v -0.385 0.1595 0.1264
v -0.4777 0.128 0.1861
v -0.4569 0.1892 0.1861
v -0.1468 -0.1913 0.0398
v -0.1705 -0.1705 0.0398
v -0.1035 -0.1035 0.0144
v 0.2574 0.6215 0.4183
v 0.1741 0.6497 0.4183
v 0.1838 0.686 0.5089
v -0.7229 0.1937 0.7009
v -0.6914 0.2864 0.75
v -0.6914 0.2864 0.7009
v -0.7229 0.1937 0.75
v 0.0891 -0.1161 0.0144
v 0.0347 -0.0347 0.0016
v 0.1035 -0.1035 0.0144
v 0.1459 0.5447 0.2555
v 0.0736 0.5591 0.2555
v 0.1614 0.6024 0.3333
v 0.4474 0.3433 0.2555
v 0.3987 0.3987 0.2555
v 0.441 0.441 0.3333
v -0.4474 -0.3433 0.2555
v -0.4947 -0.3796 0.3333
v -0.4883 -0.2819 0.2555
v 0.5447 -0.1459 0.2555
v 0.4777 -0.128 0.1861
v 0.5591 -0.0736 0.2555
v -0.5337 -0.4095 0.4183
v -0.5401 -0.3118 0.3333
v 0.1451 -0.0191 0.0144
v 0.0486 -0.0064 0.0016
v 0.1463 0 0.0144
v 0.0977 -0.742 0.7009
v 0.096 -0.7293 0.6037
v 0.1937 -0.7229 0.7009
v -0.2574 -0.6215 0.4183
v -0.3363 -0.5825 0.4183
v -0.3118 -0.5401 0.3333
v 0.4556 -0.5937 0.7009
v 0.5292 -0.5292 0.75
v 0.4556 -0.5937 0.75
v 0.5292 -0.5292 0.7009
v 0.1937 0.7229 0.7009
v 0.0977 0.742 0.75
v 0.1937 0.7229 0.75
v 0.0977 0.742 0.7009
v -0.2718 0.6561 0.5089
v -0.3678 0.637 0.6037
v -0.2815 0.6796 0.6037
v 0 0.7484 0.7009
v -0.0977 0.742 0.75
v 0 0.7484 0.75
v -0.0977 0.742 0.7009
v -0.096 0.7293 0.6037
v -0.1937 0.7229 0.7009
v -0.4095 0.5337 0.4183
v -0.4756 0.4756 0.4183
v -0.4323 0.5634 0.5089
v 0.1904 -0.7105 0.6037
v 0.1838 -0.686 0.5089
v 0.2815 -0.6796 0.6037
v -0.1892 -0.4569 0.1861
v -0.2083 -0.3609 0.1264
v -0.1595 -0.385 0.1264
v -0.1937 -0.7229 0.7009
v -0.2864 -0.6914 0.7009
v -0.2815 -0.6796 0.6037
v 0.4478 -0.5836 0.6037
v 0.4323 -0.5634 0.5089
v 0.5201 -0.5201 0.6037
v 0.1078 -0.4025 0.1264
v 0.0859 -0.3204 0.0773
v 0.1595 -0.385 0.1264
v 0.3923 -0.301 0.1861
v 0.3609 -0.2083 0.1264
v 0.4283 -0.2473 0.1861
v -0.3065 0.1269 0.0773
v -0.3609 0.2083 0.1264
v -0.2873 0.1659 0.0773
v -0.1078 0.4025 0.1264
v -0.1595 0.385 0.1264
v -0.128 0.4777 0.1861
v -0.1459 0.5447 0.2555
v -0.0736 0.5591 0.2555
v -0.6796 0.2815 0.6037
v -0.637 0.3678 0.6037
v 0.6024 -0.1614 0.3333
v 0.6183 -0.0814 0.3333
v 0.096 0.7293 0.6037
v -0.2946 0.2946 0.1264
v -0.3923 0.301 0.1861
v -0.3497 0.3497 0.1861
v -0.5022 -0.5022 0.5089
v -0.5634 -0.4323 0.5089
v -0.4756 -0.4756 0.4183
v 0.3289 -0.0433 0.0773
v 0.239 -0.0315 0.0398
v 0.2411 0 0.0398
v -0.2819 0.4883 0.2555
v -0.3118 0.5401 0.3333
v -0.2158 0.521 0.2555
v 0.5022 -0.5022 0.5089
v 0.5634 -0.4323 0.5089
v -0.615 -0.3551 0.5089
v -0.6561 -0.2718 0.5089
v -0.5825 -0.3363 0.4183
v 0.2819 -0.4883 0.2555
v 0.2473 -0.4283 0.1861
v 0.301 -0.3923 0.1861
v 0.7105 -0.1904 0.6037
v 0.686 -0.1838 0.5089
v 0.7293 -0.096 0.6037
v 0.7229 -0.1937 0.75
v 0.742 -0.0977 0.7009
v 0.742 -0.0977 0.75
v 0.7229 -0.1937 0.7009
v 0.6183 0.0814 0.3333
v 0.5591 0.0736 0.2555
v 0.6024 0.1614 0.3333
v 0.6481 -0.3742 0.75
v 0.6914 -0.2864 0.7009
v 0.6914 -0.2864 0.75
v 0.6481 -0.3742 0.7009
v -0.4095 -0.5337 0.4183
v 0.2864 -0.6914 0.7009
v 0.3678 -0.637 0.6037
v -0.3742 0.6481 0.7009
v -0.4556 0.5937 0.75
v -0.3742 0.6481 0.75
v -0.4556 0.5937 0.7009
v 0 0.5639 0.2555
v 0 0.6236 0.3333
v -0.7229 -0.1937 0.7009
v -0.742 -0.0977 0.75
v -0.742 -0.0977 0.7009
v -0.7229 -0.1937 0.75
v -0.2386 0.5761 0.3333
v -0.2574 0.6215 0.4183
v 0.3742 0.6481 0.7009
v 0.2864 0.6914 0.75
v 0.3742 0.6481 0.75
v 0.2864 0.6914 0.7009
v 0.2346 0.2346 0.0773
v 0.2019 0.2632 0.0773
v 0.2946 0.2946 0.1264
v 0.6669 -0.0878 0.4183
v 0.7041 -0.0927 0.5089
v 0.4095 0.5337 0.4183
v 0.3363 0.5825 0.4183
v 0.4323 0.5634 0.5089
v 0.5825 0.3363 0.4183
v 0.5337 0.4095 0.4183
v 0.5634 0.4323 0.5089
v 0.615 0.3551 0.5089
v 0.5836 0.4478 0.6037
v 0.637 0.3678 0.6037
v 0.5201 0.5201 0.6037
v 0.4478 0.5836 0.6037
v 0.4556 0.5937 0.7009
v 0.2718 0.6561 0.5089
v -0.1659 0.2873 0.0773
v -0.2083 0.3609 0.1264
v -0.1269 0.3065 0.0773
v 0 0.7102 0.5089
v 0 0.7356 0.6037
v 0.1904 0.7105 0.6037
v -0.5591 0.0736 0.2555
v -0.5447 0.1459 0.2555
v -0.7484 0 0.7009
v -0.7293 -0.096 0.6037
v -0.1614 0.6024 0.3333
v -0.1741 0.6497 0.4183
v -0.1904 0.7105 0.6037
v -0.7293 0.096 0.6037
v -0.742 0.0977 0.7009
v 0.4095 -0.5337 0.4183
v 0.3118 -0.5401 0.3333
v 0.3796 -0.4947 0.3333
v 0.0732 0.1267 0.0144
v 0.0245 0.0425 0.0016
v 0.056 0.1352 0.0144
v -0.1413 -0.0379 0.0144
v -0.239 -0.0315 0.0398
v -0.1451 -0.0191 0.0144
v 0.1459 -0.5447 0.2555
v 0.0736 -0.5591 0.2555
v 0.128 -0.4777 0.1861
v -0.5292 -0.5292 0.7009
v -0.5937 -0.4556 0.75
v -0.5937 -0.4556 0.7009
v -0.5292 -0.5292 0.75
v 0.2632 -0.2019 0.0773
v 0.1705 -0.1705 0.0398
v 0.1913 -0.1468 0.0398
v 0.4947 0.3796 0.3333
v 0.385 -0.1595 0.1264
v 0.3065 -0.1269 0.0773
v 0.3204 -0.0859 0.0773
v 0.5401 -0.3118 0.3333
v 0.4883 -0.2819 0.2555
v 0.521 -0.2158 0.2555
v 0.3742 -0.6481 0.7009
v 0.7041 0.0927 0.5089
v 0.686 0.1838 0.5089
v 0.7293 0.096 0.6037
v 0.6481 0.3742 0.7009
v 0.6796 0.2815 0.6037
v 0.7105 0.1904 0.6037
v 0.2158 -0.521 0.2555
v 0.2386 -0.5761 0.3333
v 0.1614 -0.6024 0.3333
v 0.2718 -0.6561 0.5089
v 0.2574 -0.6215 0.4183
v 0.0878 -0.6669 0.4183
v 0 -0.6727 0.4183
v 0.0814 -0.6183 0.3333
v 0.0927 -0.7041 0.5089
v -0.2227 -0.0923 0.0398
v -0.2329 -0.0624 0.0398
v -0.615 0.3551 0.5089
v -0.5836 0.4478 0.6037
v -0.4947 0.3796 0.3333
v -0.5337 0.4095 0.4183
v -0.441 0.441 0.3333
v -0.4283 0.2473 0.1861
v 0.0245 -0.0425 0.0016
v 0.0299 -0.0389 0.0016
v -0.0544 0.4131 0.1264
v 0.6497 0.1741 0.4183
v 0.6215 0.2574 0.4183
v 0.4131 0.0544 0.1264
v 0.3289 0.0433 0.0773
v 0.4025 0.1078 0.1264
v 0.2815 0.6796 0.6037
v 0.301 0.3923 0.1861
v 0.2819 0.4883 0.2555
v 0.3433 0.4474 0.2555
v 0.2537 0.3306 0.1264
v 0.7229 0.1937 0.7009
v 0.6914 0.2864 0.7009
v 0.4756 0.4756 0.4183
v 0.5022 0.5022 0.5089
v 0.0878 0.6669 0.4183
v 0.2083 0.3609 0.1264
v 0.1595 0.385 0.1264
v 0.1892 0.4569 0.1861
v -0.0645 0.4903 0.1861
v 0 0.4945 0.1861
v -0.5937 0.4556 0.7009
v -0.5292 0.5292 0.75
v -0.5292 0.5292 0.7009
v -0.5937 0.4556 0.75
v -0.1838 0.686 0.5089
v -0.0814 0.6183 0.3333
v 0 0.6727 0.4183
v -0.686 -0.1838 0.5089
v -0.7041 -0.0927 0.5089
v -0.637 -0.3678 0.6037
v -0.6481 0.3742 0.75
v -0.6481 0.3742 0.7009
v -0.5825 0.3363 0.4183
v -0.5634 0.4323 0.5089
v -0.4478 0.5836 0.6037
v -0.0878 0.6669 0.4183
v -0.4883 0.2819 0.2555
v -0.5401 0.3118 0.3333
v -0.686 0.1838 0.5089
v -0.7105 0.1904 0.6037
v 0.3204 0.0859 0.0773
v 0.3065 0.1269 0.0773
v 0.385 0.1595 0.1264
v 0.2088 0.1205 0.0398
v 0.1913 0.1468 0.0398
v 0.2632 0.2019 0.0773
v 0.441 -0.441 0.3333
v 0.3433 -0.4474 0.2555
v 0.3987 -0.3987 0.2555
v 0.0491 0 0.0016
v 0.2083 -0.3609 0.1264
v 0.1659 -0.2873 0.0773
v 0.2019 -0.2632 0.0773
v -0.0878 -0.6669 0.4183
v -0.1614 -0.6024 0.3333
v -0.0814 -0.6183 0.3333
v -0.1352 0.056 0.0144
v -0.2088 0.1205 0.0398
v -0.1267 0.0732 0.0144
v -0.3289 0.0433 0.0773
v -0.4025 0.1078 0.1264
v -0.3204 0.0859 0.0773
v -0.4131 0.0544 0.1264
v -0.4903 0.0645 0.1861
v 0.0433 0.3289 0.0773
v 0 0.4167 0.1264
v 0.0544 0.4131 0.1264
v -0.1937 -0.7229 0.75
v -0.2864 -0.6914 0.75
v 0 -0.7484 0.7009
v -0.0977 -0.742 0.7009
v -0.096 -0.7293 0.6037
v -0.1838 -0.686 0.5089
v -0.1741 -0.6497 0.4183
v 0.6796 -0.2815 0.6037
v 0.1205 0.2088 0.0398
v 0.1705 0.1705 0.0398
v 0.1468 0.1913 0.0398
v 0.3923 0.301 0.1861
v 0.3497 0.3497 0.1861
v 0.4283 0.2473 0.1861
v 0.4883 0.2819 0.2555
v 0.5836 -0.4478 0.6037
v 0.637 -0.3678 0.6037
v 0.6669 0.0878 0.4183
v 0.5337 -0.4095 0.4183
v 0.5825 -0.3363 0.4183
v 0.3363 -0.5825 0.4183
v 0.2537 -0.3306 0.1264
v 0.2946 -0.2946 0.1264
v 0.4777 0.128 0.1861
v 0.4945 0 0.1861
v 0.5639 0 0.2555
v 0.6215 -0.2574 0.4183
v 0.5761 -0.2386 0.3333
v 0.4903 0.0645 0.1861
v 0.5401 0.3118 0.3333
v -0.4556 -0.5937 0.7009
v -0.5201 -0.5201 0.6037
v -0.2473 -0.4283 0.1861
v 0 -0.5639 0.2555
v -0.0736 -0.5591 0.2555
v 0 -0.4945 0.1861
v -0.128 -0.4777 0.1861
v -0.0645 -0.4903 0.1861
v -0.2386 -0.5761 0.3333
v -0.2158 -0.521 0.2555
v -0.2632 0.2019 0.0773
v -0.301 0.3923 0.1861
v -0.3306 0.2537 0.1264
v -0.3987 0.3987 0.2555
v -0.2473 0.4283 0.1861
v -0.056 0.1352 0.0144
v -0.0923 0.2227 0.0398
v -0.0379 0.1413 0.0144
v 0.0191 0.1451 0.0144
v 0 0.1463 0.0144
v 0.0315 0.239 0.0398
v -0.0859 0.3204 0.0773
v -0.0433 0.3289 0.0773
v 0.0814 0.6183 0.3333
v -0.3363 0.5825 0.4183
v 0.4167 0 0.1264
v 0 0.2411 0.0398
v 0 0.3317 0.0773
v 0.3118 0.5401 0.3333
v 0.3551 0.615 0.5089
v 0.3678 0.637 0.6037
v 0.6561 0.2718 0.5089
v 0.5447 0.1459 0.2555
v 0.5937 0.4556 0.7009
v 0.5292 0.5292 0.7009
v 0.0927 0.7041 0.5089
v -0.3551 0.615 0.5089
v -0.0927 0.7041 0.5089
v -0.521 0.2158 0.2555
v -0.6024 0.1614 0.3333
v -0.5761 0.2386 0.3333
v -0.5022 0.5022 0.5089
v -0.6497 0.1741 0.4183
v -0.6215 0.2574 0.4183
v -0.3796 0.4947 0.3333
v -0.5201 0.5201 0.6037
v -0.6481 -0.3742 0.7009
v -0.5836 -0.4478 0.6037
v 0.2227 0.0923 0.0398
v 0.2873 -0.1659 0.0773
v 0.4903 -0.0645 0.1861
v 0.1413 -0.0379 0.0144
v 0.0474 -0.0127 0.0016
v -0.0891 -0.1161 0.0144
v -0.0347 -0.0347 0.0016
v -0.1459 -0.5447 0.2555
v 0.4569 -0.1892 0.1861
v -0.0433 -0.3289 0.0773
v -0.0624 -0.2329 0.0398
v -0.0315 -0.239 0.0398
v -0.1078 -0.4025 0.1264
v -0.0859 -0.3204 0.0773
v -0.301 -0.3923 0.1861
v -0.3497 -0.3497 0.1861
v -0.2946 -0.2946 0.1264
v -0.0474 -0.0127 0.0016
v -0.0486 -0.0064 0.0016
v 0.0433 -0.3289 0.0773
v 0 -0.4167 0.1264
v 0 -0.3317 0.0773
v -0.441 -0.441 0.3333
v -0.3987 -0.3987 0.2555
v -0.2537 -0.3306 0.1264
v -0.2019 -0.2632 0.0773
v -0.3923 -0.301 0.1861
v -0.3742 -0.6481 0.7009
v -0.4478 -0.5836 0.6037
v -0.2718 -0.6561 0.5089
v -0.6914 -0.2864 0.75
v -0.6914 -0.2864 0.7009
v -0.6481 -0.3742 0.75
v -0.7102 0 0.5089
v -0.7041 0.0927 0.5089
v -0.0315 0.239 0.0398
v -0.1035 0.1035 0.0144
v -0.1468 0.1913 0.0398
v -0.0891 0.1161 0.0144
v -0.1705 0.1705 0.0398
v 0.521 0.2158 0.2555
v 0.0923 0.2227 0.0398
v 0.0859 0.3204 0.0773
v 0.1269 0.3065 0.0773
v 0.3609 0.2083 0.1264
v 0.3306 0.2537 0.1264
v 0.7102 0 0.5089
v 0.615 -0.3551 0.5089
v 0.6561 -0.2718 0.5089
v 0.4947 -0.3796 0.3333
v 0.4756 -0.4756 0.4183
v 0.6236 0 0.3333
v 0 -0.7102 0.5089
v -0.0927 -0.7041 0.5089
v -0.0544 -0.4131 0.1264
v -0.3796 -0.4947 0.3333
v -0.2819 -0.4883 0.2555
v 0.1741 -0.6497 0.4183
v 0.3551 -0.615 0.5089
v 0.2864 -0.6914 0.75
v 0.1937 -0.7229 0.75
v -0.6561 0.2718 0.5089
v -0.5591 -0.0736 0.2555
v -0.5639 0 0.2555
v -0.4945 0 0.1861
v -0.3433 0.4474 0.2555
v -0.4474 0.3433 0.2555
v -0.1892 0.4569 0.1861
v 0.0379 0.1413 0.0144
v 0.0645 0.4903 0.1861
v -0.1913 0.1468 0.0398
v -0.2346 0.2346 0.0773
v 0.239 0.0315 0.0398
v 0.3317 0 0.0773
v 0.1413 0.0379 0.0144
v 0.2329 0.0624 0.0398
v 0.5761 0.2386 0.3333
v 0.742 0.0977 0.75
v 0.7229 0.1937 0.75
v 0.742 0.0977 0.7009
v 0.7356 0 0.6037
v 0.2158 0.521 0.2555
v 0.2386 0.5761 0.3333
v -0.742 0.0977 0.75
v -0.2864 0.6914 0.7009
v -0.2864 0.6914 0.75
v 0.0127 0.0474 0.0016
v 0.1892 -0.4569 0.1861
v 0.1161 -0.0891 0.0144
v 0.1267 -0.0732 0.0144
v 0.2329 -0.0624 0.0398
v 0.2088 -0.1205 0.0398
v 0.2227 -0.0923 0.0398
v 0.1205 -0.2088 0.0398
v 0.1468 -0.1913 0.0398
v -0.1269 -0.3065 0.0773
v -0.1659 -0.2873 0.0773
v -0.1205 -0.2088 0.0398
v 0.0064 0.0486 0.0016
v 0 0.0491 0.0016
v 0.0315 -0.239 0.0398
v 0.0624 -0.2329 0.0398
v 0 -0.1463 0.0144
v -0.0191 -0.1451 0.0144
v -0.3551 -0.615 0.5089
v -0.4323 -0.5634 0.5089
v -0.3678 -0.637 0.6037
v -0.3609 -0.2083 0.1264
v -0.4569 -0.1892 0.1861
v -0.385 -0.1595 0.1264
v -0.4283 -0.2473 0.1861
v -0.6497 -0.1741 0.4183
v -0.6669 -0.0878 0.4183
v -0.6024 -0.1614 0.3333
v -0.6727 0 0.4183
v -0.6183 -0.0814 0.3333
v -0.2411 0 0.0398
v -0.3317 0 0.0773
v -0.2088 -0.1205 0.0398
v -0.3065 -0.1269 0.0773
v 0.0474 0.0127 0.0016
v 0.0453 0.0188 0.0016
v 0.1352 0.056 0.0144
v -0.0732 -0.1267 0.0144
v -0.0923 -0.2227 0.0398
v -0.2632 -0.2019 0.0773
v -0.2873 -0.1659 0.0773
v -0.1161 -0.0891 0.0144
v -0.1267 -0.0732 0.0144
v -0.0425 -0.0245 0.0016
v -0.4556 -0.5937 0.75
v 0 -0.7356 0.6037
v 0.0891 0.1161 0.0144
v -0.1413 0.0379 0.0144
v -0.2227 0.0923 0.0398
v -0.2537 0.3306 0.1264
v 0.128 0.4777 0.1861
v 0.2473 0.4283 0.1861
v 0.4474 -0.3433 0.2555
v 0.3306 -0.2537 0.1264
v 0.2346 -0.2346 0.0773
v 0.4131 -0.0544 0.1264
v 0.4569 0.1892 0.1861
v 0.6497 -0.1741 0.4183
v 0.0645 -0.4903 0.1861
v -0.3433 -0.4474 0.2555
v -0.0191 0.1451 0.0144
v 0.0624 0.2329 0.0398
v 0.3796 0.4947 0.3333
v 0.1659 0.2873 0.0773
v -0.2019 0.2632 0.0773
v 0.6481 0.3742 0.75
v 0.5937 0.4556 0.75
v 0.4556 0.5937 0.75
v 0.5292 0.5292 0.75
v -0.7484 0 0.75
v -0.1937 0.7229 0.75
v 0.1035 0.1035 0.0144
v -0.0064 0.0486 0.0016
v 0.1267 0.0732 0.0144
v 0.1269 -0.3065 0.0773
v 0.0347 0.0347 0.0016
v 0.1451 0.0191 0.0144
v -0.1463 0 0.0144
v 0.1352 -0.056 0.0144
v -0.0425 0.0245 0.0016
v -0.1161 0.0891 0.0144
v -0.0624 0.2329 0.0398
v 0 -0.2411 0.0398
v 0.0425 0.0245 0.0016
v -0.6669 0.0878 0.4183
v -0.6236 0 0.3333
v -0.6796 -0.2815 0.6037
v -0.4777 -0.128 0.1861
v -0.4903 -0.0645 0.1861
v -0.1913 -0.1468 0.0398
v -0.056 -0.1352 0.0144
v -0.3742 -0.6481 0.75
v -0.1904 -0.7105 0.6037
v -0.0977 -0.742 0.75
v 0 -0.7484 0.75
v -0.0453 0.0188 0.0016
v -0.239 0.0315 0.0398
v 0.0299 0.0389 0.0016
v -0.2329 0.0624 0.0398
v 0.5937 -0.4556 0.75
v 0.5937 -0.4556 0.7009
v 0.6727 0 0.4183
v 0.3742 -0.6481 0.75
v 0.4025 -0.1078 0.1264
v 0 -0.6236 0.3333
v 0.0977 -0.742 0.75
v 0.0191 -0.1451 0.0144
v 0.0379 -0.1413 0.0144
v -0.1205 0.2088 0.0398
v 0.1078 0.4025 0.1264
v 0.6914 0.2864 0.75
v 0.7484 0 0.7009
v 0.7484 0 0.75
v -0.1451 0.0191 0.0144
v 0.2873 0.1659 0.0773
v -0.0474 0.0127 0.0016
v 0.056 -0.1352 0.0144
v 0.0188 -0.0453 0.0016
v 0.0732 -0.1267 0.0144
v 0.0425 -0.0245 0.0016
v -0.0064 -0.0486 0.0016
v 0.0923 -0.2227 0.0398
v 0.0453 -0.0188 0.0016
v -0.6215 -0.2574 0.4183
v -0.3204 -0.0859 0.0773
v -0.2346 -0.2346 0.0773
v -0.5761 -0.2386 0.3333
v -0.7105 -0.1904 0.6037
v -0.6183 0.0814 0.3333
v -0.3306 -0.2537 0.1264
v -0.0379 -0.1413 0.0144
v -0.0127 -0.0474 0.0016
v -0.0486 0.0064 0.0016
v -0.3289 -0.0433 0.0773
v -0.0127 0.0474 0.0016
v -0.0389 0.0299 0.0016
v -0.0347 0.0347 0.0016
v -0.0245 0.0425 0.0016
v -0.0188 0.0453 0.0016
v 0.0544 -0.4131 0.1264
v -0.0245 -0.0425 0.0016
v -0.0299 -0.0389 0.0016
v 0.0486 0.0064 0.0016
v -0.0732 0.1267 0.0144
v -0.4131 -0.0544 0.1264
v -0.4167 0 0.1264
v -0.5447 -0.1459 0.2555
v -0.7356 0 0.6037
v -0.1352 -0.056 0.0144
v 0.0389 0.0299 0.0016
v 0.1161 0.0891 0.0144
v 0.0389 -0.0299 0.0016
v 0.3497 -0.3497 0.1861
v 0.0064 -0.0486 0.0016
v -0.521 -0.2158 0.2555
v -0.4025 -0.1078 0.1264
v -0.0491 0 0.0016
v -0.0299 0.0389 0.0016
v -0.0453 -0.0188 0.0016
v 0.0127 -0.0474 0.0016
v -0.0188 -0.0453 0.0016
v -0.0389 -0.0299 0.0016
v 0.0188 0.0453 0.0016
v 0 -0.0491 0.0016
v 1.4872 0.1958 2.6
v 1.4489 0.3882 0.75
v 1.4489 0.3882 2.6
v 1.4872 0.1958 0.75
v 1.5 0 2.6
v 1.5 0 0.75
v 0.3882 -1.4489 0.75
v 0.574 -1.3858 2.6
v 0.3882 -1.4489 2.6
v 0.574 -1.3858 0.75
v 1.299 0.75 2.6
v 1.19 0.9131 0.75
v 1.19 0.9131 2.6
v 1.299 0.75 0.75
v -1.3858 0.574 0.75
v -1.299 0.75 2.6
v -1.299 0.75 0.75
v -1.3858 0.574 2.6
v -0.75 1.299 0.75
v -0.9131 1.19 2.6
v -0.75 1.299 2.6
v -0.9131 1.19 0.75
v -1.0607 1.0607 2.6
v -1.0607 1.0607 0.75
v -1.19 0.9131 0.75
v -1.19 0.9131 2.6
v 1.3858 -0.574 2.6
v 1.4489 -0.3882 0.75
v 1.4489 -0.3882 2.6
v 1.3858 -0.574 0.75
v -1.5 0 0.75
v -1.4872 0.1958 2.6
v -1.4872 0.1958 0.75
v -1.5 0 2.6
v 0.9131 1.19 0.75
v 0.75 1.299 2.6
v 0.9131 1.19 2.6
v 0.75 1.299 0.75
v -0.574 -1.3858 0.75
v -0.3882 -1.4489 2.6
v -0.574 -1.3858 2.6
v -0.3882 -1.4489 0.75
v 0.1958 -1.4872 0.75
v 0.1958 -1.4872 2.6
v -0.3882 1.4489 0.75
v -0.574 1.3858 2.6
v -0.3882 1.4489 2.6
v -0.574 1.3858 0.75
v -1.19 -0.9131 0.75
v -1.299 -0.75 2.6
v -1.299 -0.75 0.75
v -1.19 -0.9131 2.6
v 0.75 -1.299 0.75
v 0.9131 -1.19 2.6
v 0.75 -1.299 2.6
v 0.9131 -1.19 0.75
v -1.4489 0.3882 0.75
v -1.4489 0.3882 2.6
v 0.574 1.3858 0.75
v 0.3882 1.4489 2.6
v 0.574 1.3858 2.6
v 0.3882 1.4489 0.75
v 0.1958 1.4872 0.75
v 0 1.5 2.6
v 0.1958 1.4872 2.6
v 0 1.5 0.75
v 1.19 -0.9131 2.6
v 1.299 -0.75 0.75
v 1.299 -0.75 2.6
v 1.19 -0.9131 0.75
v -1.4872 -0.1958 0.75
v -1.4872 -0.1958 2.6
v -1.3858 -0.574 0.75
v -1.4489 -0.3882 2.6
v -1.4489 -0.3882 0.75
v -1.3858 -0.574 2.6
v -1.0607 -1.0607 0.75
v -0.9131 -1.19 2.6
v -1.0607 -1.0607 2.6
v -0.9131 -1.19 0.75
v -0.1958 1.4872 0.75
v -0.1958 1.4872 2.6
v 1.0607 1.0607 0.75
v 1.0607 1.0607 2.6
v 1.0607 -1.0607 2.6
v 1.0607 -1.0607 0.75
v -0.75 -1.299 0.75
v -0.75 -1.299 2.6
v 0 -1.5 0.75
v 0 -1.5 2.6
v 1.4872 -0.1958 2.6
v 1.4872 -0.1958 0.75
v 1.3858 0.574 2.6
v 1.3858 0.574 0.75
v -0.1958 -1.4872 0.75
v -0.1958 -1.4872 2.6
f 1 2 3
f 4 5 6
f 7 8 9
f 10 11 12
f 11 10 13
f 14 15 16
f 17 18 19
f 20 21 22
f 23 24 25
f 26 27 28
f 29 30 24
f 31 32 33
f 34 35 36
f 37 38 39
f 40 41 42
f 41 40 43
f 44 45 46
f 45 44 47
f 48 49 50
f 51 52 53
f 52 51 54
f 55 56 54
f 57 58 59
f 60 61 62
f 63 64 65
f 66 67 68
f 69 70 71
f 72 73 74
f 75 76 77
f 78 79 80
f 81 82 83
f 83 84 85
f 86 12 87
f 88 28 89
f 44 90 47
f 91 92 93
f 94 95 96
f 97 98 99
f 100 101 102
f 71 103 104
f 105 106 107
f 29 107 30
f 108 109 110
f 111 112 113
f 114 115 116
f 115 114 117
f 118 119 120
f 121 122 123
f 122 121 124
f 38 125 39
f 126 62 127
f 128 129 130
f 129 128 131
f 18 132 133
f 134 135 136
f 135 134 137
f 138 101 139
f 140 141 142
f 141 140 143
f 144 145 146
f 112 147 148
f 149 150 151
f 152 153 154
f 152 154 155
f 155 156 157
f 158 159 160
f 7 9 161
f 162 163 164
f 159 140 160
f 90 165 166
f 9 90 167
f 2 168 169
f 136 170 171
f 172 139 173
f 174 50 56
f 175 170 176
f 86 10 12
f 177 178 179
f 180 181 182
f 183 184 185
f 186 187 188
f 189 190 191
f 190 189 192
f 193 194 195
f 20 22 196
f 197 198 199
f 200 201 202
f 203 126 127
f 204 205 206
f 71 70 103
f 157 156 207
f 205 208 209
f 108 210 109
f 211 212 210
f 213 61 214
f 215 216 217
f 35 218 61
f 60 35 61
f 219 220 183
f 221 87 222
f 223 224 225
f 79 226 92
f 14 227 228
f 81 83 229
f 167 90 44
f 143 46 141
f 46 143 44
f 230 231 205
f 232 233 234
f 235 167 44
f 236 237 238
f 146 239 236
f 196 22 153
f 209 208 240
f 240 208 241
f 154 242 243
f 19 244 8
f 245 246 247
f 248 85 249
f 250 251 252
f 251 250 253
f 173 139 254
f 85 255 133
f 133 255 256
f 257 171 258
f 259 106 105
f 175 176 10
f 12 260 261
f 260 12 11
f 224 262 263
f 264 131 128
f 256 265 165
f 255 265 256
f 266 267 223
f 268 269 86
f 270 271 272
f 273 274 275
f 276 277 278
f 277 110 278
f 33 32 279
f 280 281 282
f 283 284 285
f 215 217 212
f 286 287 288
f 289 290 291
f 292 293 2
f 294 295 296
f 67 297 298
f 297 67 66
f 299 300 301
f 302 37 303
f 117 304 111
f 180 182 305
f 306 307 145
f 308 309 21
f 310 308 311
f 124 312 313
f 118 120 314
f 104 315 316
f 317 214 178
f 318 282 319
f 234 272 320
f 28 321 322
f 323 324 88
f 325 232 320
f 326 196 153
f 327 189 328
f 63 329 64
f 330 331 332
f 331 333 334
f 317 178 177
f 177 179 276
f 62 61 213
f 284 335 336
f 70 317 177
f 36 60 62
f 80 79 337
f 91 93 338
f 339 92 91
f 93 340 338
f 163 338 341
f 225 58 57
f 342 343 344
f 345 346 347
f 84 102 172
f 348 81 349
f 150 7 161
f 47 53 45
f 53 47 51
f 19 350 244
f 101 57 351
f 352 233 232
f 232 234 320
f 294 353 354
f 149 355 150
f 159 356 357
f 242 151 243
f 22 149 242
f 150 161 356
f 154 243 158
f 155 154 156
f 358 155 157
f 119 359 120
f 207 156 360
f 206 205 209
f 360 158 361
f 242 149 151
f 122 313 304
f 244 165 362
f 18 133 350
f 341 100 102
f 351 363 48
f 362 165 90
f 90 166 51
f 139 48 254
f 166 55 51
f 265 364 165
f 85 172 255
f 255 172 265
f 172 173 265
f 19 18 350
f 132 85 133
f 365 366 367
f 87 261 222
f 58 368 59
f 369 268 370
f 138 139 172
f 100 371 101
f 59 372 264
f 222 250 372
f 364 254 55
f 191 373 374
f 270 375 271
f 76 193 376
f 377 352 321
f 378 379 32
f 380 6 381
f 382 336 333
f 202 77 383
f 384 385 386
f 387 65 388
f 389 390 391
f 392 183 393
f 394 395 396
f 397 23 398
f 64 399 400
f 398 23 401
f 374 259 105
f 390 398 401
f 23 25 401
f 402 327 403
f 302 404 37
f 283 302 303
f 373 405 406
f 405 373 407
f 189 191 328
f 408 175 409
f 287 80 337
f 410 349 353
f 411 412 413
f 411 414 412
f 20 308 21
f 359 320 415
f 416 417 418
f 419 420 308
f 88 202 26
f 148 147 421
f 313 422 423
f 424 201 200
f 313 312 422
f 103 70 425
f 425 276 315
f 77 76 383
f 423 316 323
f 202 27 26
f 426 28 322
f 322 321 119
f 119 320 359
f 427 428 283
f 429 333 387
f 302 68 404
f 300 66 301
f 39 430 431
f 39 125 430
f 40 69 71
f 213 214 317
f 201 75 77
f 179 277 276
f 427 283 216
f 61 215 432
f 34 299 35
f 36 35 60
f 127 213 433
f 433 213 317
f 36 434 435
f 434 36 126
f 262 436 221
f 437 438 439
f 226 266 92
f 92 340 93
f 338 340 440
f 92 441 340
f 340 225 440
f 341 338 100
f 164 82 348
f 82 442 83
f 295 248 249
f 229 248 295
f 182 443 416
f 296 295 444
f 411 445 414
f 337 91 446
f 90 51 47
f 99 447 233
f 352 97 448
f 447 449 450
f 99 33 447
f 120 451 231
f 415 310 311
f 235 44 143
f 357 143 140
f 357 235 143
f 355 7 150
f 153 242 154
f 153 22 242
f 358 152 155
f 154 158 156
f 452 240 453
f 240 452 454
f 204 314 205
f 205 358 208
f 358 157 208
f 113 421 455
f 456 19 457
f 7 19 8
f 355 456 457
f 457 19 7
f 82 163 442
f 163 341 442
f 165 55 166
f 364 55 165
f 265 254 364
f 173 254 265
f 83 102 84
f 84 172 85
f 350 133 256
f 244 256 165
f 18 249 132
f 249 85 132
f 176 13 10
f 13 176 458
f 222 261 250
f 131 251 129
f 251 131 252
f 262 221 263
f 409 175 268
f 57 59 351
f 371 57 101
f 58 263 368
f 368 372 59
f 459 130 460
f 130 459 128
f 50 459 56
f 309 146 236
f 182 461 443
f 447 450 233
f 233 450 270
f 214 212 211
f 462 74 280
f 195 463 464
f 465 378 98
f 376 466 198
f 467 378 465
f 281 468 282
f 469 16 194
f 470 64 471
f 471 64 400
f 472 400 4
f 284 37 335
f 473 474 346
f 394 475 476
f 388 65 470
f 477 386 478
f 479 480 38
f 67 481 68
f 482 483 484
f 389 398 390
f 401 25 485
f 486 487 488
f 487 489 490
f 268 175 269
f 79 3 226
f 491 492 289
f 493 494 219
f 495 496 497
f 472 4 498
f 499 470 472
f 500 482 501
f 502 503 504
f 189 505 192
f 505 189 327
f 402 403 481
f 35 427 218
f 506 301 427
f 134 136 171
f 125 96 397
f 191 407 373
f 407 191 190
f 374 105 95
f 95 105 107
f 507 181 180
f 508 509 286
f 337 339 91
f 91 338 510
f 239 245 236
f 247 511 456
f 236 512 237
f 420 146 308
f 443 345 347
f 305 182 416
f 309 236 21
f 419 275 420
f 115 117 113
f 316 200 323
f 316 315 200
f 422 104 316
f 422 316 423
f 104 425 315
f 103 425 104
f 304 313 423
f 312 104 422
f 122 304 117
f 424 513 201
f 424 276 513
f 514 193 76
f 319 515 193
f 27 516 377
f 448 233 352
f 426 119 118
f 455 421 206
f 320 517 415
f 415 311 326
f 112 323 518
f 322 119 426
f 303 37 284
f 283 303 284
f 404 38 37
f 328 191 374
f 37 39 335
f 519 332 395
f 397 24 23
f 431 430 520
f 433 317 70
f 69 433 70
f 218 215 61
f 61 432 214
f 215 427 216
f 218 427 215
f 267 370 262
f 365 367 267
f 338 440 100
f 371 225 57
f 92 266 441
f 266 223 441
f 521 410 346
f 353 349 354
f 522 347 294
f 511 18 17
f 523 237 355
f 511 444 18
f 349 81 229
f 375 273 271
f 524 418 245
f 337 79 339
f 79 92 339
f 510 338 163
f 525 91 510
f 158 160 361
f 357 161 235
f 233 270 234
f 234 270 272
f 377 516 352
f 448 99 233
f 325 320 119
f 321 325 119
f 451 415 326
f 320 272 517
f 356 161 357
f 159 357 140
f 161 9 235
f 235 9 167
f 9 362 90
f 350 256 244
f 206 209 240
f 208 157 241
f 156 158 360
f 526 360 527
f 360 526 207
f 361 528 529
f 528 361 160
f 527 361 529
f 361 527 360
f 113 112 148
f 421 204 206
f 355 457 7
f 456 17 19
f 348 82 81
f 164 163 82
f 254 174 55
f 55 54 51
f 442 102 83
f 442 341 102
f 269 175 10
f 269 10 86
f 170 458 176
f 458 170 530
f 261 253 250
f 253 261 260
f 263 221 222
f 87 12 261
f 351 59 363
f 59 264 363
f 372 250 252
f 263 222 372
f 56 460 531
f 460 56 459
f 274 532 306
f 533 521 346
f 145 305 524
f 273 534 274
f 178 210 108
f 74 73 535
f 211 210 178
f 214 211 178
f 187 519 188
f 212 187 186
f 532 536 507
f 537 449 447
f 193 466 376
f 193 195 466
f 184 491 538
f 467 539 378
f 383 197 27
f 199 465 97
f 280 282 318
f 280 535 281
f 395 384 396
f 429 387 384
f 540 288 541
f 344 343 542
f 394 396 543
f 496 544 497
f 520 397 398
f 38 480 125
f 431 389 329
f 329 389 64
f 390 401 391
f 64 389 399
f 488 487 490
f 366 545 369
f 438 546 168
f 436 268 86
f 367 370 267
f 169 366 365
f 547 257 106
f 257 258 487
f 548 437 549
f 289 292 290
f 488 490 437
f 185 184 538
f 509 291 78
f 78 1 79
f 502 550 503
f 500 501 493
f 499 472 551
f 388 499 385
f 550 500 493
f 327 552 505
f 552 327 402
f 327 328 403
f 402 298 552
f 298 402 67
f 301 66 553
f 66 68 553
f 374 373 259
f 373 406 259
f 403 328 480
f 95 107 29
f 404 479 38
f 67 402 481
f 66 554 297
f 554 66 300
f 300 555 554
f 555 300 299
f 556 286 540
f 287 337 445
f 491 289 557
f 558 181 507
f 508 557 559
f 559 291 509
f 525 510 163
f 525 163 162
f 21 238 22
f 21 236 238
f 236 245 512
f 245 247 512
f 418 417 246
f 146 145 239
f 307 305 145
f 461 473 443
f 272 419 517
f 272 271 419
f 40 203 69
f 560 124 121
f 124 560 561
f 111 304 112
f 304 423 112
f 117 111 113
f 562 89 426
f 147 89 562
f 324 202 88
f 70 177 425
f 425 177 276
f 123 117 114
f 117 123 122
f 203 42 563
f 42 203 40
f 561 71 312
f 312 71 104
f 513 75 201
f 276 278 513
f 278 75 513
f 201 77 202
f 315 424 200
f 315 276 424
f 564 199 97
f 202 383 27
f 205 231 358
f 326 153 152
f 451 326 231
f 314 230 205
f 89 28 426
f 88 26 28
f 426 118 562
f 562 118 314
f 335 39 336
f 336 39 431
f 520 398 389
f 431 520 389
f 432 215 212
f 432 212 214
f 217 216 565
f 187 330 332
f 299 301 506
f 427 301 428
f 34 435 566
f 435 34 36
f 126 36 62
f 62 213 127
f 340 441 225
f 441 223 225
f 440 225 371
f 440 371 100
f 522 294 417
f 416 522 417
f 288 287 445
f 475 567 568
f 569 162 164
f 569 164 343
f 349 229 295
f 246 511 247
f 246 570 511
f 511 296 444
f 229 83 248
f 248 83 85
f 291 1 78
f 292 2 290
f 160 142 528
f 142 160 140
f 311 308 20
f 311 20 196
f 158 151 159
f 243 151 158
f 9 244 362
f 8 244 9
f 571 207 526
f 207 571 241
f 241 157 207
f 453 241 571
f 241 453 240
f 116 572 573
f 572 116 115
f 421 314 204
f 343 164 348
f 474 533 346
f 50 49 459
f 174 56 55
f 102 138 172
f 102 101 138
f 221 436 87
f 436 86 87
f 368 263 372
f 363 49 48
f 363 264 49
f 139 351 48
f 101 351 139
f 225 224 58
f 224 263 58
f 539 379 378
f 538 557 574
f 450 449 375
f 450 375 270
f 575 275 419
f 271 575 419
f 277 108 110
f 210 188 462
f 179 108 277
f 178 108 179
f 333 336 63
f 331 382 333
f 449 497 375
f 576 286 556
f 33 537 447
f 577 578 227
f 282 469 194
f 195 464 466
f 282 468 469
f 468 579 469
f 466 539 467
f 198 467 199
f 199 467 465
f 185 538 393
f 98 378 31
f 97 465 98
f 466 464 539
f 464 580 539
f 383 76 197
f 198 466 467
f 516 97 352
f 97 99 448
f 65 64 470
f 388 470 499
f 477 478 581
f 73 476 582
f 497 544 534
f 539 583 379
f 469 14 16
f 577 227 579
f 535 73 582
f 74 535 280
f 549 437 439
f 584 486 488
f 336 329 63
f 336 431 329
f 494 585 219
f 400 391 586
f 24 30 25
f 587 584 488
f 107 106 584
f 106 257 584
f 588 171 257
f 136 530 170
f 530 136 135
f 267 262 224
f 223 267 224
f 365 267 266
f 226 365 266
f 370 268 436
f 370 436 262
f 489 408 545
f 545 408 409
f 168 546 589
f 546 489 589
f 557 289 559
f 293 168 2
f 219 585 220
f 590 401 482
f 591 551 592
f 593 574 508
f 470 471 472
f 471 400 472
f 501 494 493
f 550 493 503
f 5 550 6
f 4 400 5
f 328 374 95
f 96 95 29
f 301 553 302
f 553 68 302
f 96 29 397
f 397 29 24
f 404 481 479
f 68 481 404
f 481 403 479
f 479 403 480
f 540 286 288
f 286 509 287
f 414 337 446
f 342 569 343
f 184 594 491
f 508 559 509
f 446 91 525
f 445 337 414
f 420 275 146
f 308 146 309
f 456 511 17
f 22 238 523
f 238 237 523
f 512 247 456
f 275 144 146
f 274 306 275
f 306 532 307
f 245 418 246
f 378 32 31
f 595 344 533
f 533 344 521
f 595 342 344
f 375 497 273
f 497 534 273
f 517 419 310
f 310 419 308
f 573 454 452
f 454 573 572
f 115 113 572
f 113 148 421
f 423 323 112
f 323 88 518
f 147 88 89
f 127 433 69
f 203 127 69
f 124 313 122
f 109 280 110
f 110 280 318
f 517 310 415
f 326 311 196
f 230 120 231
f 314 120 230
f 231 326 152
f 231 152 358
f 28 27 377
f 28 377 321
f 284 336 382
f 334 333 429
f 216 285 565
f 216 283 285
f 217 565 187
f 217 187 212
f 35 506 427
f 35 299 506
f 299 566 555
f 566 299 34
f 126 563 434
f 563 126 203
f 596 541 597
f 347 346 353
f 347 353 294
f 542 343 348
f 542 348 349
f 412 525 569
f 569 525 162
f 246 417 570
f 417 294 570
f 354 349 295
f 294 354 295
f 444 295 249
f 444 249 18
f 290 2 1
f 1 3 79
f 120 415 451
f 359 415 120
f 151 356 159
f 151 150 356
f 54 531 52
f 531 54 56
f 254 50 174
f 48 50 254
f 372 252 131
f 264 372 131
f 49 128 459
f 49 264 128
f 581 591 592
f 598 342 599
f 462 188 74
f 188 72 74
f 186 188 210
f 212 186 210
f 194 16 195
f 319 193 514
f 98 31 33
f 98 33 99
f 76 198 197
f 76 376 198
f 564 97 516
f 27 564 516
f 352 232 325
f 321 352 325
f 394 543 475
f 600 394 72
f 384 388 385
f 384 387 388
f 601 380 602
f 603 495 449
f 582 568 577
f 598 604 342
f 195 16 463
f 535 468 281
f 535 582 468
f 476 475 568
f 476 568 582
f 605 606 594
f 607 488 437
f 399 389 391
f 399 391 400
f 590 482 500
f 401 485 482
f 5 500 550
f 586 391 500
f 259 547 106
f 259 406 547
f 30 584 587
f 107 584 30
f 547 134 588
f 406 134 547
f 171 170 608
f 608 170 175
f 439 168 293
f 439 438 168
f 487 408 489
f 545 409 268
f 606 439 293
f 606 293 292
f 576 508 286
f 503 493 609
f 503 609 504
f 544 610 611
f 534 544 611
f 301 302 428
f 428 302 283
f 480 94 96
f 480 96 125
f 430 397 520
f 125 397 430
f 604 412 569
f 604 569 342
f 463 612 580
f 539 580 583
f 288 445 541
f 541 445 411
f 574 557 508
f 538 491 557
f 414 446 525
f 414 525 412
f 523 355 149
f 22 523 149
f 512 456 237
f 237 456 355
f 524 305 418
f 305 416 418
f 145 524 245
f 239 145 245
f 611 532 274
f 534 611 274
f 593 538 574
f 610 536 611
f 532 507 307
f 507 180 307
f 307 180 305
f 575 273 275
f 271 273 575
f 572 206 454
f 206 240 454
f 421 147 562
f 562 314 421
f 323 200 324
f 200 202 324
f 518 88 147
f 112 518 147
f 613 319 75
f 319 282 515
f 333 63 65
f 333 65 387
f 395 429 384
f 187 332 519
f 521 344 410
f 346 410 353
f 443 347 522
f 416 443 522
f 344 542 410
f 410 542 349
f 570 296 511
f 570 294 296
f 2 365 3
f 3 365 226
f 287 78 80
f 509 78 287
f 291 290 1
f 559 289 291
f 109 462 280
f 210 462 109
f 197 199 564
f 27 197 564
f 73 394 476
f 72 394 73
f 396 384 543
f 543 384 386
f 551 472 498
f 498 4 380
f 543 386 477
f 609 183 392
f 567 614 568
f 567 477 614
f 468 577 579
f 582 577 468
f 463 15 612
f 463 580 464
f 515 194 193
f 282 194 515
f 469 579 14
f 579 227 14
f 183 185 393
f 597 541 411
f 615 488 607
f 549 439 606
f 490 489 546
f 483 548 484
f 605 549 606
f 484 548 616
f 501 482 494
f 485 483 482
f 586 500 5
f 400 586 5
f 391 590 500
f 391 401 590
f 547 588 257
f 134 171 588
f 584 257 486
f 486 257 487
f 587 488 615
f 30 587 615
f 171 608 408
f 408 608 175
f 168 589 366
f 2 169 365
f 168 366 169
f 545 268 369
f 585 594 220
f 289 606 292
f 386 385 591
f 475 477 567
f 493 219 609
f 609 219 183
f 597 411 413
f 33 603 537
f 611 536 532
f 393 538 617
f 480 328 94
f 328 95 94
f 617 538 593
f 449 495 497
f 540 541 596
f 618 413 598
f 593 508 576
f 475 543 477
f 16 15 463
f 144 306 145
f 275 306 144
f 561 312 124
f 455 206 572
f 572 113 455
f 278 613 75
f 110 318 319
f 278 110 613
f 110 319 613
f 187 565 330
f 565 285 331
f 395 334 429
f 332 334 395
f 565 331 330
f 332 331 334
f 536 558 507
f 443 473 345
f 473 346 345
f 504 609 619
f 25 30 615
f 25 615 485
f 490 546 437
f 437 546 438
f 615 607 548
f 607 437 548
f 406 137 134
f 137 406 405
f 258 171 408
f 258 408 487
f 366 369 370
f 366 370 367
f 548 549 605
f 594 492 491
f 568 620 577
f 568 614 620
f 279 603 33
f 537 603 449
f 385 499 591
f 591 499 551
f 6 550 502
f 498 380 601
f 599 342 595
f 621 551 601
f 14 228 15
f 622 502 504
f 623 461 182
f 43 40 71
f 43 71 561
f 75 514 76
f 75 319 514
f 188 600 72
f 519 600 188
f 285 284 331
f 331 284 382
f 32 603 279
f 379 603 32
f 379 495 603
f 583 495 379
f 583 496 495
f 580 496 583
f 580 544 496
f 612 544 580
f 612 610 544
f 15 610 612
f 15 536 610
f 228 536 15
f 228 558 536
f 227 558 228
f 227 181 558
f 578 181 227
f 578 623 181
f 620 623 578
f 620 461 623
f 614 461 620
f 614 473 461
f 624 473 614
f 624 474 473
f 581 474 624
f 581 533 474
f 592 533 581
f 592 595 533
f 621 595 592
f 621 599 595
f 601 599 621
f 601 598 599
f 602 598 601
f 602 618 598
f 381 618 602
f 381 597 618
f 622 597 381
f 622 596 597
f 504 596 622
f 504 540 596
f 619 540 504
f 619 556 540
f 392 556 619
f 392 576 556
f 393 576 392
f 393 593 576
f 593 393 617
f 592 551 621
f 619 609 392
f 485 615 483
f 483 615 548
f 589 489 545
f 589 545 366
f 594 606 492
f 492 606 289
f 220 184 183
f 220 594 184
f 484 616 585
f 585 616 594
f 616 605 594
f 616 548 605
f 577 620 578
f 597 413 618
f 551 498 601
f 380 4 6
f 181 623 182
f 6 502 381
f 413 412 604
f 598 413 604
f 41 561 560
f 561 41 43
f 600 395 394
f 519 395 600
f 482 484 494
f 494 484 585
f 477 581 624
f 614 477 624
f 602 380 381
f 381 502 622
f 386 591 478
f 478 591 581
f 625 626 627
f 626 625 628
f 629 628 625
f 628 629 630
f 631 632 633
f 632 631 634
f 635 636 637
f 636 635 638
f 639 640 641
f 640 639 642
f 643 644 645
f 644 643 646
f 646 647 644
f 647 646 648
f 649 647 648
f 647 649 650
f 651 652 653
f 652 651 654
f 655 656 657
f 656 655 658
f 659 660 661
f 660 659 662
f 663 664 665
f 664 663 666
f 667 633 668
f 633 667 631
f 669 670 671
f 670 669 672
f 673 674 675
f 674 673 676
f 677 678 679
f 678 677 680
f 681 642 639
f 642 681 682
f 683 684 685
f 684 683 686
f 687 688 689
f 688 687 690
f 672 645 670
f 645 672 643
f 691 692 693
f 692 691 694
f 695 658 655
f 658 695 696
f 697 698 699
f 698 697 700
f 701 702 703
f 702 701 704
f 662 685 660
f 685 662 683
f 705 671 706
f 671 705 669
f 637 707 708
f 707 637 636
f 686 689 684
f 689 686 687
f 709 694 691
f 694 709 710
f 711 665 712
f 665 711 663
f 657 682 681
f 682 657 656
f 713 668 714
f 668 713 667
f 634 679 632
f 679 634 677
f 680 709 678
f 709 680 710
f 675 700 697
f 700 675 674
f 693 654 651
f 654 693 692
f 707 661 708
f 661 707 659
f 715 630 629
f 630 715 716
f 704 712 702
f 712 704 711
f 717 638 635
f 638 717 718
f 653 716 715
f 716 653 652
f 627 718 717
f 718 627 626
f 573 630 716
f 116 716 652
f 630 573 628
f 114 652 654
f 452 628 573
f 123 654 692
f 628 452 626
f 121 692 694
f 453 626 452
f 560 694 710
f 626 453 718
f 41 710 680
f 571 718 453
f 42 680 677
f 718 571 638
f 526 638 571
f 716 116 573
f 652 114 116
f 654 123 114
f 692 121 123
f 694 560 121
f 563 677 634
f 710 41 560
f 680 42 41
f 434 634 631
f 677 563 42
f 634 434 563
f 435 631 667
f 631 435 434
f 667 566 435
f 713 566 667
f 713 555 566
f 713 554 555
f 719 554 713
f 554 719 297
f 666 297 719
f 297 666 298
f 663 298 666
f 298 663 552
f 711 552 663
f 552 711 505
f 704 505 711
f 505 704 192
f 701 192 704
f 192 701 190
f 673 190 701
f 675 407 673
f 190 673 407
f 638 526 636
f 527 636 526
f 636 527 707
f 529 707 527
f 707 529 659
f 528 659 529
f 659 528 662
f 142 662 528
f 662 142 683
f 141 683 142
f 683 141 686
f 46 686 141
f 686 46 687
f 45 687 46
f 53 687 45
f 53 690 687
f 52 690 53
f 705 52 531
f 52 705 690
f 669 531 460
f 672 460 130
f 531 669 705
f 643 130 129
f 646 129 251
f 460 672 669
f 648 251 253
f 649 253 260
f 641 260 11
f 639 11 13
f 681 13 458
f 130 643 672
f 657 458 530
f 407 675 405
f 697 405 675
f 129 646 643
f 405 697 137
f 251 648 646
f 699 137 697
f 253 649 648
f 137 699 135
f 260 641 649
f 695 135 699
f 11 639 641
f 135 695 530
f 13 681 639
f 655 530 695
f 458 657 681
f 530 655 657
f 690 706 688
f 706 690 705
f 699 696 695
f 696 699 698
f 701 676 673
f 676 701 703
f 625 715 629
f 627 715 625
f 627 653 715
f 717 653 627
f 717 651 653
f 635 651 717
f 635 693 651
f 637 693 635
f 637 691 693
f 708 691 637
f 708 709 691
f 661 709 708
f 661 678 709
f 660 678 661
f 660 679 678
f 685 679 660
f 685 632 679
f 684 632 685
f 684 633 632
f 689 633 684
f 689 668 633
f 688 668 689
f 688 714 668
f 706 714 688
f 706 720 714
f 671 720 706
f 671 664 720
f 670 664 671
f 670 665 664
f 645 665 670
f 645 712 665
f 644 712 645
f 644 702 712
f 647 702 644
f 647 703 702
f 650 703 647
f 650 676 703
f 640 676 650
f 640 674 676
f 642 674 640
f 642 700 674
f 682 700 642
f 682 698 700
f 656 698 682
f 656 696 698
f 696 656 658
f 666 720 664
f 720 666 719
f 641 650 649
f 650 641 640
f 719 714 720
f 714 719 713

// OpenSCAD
$fn = 48;
// Purchased spring-ball detent cartridge, simplified.  Ball at z=0 (tip),
// body Ø3.0 x 1.85.  M3 body, light spring, ball Ø1.5.
translate([0,0,0.75]) sphere(r=0.75);
translate([0,0,0.75]) cylinder(h=1.85, r=1.5, center=false);
translate([0,0,2.4]) cylinder(h=0.20, r=1.5, center=false);
